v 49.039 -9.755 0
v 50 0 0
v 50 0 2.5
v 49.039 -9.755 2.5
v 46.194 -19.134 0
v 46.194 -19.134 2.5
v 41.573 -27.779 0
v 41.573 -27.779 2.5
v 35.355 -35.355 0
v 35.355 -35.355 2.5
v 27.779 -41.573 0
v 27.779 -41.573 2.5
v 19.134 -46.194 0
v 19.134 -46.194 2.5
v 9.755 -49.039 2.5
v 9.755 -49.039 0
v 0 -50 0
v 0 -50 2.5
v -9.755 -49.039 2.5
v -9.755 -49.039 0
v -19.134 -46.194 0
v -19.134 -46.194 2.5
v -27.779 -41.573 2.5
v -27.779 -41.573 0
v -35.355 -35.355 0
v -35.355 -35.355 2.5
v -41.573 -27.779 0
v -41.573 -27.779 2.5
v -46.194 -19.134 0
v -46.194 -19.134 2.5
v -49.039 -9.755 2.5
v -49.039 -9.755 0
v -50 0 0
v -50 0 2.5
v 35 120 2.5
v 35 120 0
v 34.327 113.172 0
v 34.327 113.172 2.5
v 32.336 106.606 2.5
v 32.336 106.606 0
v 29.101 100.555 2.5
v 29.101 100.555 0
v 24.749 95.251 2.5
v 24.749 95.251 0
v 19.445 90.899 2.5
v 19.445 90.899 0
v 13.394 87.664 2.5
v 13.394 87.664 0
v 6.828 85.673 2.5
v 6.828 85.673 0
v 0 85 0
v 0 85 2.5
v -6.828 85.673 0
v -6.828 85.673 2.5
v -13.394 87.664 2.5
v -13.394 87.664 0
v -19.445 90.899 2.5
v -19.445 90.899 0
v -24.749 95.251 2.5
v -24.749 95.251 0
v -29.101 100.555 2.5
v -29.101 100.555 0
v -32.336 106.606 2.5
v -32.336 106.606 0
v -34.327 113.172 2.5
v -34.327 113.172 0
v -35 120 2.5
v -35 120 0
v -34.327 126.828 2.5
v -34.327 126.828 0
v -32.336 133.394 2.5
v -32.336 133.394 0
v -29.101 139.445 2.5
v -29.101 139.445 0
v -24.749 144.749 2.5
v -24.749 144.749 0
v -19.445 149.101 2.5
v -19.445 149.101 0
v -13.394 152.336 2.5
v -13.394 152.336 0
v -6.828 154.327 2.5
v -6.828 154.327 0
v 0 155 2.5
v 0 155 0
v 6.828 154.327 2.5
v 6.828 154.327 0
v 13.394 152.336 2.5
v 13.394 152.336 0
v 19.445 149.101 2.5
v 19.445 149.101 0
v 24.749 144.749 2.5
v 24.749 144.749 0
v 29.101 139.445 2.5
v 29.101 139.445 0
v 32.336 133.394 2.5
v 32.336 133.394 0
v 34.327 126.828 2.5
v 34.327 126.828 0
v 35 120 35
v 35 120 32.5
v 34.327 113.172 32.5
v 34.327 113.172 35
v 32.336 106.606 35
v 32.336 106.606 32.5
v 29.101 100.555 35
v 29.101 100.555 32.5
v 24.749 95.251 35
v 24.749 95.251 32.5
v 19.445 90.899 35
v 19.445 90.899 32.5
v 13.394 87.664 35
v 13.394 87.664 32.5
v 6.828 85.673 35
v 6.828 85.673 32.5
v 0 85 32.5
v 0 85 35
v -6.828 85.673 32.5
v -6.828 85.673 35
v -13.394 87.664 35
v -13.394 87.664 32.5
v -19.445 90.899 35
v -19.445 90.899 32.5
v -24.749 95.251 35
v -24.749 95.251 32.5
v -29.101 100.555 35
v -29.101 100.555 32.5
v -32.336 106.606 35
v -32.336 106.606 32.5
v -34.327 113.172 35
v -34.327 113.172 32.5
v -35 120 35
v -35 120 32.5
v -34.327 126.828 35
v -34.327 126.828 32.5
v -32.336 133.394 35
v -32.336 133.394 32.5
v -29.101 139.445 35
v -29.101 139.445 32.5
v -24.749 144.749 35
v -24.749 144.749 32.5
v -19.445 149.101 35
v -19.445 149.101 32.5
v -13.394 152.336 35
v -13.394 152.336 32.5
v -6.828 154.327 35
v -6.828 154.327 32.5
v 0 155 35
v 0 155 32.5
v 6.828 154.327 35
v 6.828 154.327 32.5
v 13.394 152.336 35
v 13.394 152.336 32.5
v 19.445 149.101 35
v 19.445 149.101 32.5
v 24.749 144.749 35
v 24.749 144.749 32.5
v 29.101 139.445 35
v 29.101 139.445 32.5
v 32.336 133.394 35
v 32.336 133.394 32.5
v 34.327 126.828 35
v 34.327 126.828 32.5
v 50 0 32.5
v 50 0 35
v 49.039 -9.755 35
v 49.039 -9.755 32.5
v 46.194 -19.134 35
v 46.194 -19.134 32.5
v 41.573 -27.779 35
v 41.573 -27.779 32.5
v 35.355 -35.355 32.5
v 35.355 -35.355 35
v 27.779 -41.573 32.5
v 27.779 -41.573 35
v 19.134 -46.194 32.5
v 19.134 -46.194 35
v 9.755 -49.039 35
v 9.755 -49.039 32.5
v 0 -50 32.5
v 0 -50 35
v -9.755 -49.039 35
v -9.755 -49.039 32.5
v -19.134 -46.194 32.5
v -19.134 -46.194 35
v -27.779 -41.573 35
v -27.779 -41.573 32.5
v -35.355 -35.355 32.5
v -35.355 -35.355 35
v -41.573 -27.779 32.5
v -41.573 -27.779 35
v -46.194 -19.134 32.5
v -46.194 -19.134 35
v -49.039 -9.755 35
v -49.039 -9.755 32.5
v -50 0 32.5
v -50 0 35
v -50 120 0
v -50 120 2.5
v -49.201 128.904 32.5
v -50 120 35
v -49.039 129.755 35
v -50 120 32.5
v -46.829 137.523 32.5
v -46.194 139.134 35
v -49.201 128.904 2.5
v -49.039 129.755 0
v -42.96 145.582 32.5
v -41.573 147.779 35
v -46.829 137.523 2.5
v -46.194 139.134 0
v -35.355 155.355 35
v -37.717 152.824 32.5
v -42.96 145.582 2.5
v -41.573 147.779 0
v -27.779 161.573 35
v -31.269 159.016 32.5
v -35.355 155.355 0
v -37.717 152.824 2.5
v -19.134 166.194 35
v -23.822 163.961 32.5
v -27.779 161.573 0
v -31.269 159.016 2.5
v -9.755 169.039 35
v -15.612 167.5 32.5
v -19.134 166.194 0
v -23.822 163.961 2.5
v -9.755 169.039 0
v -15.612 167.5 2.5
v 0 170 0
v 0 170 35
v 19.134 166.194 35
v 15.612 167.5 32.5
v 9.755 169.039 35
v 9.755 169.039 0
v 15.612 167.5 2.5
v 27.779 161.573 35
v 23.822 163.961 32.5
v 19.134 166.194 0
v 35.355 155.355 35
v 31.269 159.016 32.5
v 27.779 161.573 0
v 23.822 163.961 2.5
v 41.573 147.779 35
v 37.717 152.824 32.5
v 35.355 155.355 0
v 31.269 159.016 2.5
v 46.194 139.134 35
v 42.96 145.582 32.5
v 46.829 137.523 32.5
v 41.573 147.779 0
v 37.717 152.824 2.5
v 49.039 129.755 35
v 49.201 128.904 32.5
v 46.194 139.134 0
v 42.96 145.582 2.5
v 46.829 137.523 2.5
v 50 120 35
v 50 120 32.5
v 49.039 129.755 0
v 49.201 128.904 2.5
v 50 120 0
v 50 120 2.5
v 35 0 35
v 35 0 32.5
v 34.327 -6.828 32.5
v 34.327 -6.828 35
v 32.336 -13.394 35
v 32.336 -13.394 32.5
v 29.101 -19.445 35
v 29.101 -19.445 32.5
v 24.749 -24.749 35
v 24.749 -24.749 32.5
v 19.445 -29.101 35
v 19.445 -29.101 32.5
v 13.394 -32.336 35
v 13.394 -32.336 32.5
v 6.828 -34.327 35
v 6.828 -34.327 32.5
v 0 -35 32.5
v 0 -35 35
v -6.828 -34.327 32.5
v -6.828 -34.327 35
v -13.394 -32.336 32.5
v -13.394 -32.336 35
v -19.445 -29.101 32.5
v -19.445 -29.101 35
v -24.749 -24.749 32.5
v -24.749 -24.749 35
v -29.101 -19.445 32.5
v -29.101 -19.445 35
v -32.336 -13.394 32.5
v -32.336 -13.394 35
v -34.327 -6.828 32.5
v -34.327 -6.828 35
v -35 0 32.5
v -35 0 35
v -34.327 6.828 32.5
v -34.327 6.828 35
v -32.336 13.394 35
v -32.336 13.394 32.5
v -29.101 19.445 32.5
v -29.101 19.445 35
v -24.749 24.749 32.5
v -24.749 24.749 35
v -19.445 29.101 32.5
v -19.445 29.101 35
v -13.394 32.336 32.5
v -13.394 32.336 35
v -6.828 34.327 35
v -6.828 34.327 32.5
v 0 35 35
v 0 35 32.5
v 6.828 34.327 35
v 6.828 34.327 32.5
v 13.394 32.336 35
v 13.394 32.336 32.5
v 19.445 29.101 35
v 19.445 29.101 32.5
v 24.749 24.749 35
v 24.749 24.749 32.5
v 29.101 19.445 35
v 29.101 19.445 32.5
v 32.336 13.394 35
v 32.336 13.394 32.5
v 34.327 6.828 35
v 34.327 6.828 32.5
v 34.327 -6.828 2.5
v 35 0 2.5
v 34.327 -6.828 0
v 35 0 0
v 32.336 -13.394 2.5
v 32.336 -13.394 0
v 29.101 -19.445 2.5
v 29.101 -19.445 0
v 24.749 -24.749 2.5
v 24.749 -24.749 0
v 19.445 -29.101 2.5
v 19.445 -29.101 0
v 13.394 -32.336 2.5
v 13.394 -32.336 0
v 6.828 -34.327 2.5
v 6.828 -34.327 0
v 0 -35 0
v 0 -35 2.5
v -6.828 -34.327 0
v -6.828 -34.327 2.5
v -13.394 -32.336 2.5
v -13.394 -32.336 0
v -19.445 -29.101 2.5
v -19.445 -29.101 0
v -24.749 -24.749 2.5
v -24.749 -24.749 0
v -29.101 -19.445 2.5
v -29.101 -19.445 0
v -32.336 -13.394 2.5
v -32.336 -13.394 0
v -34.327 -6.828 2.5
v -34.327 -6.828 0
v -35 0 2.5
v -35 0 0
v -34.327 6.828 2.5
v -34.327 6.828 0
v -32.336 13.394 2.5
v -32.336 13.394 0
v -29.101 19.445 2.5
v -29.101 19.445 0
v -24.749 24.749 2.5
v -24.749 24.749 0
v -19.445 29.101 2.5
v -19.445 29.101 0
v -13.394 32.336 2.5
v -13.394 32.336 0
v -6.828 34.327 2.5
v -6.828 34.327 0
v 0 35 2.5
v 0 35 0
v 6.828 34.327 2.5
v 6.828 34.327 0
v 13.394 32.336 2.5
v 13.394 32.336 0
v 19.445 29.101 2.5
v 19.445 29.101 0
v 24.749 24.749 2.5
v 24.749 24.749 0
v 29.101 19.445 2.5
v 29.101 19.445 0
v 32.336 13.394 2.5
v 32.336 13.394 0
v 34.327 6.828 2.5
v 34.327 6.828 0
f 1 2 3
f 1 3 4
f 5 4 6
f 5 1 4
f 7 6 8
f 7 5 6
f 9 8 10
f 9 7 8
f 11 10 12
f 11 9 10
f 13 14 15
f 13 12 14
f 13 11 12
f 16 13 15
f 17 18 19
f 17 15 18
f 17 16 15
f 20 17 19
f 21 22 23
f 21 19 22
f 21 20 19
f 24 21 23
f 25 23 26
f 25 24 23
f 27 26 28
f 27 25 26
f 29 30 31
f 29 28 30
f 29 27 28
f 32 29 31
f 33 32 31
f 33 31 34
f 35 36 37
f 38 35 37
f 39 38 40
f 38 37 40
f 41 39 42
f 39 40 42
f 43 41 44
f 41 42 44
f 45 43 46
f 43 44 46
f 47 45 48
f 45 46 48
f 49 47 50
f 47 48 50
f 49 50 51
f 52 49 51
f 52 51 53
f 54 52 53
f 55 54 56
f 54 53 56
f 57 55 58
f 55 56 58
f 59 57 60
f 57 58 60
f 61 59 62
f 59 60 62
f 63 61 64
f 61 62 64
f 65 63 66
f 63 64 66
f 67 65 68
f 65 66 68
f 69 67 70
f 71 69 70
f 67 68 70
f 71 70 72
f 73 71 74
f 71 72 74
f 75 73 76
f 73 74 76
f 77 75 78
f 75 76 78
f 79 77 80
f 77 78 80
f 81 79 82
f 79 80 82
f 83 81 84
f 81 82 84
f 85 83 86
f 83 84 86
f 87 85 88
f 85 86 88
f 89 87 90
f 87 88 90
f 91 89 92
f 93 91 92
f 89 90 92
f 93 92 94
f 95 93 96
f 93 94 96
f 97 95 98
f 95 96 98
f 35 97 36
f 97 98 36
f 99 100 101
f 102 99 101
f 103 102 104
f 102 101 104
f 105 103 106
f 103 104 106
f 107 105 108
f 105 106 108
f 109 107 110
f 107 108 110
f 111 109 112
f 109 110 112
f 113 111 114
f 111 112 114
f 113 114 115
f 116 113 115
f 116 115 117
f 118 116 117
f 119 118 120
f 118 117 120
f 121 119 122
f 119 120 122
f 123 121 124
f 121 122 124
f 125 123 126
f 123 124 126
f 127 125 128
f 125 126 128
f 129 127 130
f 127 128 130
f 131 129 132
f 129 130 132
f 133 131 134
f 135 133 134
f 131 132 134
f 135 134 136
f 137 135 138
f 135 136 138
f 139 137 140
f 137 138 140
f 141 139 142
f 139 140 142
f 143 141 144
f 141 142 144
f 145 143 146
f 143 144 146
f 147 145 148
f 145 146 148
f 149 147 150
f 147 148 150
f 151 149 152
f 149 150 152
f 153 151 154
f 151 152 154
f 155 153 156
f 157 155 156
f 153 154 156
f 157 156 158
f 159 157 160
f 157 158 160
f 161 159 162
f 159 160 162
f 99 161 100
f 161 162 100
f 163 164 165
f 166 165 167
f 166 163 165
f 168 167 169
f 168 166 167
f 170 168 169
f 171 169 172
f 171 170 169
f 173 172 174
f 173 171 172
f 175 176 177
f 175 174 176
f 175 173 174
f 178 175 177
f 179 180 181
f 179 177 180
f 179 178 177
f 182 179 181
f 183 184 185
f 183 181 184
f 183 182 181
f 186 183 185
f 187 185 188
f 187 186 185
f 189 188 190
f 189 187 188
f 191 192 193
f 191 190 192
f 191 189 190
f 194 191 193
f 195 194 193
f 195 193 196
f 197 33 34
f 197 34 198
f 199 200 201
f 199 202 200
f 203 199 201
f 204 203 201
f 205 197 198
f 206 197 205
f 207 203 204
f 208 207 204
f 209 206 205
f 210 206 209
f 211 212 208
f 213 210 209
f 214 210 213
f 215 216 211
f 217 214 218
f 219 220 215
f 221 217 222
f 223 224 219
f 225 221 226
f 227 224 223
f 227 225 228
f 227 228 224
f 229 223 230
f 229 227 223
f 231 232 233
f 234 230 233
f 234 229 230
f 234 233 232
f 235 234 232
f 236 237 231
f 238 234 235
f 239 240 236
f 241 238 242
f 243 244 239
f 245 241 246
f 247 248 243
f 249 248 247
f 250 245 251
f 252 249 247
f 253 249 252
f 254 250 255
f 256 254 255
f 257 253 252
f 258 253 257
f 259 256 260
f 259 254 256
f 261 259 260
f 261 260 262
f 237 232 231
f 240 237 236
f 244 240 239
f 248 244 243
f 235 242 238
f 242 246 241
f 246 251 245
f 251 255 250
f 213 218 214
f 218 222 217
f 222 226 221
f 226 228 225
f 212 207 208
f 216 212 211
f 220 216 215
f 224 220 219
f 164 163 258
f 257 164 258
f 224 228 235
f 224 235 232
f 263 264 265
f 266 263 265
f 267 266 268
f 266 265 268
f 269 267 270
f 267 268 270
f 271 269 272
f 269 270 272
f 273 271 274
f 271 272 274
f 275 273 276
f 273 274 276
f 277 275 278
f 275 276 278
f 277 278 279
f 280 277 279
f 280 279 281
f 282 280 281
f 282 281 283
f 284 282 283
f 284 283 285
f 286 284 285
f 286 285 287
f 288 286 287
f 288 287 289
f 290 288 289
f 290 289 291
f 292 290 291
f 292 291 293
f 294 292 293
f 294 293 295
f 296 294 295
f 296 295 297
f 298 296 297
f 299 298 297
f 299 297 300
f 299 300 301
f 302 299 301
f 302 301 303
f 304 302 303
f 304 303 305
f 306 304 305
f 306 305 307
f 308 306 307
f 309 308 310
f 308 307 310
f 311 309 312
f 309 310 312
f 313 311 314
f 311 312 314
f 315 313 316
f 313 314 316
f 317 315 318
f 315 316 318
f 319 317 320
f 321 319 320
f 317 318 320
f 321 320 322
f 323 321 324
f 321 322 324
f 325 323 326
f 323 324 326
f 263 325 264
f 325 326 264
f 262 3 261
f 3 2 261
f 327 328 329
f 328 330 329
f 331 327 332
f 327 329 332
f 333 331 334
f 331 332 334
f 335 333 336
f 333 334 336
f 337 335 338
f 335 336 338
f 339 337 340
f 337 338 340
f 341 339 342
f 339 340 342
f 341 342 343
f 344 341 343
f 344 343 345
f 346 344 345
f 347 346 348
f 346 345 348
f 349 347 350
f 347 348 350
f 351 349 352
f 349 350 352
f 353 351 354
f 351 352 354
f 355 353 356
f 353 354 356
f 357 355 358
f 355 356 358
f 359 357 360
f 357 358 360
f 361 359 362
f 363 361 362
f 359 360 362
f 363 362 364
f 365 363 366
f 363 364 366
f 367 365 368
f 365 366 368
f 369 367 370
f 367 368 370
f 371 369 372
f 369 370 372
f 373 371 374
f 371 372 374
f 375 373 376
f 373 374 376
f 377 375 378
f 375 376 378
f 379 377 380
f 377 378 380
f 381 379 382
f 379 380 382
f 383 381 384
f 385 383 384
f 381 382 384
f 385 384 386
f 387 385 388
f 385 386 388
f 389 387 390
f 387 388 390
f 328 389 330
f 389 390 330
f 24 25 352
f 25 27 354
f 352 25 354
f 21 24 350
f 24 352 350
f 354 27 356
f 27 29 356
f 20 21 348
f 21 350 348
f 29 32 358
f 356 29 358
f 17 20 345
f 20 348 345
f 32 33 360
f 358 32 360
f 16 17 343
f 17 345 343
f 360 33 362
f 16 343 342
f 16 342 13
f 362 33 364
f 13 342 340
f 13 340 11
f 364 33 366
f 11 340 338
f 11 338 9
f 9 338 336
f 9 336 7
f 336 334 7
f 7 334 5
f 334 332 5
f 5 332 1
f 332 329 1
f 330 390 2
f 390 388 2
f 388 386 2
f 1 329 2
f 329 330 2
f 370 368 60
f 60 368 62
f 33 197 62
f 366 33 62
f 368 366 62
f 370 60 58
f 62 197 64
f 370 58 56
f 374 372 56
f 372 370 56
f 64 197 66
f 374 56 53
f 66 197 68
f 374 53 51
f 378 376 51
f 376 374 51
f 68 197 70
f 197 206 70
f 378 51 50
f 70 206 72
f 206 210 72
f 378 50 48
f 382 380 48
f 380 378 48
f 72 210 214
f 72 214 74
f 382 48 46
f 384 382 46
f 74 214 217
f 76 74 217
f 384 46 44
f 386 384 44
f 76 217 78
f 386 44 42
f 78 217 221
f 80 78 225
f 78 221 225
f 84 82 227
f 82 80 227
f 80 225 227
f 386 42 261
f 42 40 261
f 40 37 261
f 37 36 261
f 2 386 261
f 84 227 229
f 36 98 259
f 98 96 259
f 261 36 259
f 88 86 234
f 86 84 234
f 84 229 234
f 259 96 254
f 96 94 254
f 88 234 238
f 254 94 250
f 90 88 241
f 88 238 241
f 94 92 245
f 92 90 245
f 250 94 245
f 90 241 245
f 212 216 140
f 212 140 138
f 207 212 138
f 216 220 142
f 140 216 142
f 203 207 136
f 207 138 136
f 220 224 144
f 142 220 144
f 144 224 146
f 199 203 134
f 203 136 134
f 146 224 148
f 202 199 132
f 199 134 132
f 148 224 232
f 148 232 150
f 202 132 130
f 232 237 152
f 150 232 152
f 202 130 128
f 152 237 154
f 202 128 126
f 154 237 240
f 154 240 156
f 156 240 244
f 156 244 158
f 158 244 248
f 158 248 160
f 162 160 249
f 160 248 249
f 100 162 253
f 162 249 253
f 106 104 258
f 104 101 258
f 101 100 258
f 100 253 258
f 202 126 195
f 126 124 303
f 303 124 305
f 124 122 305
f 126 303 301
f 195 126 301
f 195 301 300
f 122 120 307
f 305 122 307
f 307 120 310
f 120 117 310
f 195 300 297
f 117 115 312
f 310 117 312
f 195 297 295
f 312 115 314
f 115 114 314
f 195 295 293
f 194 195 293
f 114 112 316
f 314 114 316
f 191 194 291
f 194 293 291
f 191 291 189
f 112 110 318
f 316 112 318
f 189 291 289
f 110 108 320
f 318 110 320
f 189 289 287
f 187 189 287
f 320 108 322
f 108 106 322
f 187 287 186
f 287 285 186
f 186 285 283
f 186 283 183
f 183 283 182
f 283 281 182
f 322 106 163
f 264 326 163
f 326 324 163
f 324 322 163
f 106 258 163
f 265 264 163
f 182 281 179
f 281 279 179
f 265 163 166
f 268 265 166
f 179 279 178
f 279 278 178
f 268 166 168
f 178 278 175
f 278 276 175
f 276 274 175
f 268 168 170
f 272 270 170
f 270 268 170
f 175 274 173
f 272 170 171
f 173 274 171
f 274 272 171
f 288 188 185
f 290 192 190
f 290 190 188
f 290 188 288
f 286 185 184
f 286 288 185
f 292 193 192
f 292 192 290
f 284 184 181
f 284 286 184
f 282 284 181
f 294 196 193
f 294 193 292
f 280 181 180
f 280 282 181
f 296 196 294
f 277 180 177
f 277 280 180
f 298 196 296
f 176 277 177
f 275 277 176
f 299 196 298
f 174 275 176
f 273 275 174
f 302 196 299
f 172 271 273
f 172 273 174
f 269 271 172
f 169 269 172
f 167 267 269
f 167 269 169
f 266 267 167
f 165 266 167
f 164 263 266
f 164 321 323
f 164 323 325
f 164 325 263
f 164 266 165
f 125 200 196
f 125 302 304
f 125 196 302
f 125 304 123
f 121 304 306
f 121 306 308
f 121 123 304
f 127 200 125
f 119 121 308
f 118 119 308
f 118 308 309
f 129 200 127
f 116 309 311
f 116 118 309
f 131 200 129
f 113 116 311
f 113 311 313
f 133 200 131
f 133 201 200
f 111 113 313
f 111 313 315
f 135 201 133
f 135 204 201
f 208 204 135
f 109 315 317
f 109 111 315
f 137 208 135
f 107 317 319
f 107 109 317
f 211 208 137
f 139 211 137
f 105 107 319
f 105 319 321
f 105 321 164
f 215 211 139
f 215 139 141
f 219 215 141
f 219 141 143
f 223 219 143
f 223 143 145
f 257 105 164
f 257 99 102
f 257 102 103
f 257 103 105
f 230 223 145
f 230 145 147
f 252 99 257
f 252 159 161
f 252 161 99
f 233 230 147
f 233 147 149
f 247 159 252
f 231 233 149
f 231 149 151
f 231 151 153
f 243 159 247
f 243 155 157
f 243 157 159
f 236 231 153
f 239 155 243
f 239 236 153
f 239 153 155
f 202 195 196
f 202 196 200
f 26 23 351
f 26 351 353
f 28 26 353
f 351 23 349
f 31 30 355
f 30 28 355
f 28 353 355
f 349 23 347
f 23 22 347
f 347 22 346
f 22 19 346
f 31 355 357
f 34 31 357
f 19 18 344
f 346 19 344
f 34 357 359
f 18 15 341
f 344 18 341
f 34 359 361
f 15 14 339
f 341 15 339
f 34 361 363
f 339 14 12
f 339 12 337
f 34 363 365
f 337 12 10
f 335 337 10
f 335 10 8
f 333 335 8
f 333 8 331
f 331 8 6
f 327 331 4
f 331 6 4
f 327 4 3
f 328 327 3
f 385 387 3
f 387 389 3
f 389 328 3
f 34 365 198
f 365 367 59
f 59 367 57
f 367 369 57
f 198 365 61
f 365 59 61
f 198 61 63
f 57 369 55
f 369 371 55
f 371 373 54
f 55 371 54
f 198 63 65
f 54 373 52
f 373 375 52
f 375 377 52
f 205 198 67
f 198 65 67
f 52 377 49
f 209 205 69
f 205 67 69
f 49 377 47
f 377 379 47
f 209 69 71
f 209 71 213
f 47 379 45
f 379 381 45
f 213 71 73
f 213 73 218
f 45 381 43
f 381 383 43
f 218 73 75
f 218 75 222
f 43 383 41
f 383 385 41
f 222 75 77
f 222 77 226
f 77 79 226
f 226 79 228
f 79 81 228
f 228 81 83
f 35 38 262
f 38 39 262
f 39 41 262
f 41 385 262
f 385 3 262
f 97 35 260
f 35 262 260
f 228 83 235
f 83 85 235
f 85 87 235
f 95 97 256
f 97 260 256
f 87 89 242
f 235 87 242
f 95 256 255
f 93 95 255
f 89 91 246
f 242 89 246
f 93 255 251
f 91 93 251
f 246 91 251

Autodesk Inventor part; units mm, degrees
ref_plane "YZ Plane" through (0, 0, 0) normal (1, 0, 0) x (0, 1, 0)
ref_plane "XZ Plane" through (0, 0, 0) normal (0, 1, 0) x (-1, 0, 0)
ref_plane "XY Plane" through (0, 0, 0) normal (0, 0, 1) x (1, 0, 0)
sketch "Sketch1" plane through (0, 0, 0) normal (0, 0, 1) x (1, 0, 0)
  circle A0 centre (0, 0) radius 35
  circle A1 centre (0, 120) radius 35
  arc A2 (-50, 0) -> (50, 0) centre (0, 0) ccw
  arc A3 (50, 120) -> (-50, 120) centre (0, 120) ccw
  line L0 (-50, 0) -> (-50, 120)
  line L1 (50, 0) -> (50, 120)
  line L2 (0, 35) -> (0, 85)
  dimension "d0" = 70
  dimension "d1" = 70
  dimension "d3" = 15
  dimension "d4" = 15
  dimension "d7" = 50
extrude "Extrusion1" add sketch "Sketch1" along normal blind 35
sketch "Sketch2" plane through (50, 0, 0) normal (1, 0, 0) x (0, 0, -1)
  line L0 (-35, 170) -> (0, 170)
  line L1 (0, 170) -> (0, -50)
  line L2 (0, -50) -> (-35, -50)
  line L3 (-35, -50) -> (-35, 170)
  line L4 (-2.5, -47.5) -> (-2.5, 167.5)
  line L5 (-2.5, 167.5) -> (-32.5, 167.5)
  line L6 (-32.5, 167.5) -> (-32.5, -47.5)
  line L7 (-32.5, -47.5) -> (-32.5, -50)
  line L8 (-2.5, -47.5) -> (-2.5, -50)
  dimension "d8" = 220
  dimension "d9" = 2.5
extrude "Extrusion2" cut sketch "Sketch2" against normal blind 300 contours L7 L6 L5 L4 L8 L2
properties part number "sambungan leaf spring 1" material "Steel, Mild"
